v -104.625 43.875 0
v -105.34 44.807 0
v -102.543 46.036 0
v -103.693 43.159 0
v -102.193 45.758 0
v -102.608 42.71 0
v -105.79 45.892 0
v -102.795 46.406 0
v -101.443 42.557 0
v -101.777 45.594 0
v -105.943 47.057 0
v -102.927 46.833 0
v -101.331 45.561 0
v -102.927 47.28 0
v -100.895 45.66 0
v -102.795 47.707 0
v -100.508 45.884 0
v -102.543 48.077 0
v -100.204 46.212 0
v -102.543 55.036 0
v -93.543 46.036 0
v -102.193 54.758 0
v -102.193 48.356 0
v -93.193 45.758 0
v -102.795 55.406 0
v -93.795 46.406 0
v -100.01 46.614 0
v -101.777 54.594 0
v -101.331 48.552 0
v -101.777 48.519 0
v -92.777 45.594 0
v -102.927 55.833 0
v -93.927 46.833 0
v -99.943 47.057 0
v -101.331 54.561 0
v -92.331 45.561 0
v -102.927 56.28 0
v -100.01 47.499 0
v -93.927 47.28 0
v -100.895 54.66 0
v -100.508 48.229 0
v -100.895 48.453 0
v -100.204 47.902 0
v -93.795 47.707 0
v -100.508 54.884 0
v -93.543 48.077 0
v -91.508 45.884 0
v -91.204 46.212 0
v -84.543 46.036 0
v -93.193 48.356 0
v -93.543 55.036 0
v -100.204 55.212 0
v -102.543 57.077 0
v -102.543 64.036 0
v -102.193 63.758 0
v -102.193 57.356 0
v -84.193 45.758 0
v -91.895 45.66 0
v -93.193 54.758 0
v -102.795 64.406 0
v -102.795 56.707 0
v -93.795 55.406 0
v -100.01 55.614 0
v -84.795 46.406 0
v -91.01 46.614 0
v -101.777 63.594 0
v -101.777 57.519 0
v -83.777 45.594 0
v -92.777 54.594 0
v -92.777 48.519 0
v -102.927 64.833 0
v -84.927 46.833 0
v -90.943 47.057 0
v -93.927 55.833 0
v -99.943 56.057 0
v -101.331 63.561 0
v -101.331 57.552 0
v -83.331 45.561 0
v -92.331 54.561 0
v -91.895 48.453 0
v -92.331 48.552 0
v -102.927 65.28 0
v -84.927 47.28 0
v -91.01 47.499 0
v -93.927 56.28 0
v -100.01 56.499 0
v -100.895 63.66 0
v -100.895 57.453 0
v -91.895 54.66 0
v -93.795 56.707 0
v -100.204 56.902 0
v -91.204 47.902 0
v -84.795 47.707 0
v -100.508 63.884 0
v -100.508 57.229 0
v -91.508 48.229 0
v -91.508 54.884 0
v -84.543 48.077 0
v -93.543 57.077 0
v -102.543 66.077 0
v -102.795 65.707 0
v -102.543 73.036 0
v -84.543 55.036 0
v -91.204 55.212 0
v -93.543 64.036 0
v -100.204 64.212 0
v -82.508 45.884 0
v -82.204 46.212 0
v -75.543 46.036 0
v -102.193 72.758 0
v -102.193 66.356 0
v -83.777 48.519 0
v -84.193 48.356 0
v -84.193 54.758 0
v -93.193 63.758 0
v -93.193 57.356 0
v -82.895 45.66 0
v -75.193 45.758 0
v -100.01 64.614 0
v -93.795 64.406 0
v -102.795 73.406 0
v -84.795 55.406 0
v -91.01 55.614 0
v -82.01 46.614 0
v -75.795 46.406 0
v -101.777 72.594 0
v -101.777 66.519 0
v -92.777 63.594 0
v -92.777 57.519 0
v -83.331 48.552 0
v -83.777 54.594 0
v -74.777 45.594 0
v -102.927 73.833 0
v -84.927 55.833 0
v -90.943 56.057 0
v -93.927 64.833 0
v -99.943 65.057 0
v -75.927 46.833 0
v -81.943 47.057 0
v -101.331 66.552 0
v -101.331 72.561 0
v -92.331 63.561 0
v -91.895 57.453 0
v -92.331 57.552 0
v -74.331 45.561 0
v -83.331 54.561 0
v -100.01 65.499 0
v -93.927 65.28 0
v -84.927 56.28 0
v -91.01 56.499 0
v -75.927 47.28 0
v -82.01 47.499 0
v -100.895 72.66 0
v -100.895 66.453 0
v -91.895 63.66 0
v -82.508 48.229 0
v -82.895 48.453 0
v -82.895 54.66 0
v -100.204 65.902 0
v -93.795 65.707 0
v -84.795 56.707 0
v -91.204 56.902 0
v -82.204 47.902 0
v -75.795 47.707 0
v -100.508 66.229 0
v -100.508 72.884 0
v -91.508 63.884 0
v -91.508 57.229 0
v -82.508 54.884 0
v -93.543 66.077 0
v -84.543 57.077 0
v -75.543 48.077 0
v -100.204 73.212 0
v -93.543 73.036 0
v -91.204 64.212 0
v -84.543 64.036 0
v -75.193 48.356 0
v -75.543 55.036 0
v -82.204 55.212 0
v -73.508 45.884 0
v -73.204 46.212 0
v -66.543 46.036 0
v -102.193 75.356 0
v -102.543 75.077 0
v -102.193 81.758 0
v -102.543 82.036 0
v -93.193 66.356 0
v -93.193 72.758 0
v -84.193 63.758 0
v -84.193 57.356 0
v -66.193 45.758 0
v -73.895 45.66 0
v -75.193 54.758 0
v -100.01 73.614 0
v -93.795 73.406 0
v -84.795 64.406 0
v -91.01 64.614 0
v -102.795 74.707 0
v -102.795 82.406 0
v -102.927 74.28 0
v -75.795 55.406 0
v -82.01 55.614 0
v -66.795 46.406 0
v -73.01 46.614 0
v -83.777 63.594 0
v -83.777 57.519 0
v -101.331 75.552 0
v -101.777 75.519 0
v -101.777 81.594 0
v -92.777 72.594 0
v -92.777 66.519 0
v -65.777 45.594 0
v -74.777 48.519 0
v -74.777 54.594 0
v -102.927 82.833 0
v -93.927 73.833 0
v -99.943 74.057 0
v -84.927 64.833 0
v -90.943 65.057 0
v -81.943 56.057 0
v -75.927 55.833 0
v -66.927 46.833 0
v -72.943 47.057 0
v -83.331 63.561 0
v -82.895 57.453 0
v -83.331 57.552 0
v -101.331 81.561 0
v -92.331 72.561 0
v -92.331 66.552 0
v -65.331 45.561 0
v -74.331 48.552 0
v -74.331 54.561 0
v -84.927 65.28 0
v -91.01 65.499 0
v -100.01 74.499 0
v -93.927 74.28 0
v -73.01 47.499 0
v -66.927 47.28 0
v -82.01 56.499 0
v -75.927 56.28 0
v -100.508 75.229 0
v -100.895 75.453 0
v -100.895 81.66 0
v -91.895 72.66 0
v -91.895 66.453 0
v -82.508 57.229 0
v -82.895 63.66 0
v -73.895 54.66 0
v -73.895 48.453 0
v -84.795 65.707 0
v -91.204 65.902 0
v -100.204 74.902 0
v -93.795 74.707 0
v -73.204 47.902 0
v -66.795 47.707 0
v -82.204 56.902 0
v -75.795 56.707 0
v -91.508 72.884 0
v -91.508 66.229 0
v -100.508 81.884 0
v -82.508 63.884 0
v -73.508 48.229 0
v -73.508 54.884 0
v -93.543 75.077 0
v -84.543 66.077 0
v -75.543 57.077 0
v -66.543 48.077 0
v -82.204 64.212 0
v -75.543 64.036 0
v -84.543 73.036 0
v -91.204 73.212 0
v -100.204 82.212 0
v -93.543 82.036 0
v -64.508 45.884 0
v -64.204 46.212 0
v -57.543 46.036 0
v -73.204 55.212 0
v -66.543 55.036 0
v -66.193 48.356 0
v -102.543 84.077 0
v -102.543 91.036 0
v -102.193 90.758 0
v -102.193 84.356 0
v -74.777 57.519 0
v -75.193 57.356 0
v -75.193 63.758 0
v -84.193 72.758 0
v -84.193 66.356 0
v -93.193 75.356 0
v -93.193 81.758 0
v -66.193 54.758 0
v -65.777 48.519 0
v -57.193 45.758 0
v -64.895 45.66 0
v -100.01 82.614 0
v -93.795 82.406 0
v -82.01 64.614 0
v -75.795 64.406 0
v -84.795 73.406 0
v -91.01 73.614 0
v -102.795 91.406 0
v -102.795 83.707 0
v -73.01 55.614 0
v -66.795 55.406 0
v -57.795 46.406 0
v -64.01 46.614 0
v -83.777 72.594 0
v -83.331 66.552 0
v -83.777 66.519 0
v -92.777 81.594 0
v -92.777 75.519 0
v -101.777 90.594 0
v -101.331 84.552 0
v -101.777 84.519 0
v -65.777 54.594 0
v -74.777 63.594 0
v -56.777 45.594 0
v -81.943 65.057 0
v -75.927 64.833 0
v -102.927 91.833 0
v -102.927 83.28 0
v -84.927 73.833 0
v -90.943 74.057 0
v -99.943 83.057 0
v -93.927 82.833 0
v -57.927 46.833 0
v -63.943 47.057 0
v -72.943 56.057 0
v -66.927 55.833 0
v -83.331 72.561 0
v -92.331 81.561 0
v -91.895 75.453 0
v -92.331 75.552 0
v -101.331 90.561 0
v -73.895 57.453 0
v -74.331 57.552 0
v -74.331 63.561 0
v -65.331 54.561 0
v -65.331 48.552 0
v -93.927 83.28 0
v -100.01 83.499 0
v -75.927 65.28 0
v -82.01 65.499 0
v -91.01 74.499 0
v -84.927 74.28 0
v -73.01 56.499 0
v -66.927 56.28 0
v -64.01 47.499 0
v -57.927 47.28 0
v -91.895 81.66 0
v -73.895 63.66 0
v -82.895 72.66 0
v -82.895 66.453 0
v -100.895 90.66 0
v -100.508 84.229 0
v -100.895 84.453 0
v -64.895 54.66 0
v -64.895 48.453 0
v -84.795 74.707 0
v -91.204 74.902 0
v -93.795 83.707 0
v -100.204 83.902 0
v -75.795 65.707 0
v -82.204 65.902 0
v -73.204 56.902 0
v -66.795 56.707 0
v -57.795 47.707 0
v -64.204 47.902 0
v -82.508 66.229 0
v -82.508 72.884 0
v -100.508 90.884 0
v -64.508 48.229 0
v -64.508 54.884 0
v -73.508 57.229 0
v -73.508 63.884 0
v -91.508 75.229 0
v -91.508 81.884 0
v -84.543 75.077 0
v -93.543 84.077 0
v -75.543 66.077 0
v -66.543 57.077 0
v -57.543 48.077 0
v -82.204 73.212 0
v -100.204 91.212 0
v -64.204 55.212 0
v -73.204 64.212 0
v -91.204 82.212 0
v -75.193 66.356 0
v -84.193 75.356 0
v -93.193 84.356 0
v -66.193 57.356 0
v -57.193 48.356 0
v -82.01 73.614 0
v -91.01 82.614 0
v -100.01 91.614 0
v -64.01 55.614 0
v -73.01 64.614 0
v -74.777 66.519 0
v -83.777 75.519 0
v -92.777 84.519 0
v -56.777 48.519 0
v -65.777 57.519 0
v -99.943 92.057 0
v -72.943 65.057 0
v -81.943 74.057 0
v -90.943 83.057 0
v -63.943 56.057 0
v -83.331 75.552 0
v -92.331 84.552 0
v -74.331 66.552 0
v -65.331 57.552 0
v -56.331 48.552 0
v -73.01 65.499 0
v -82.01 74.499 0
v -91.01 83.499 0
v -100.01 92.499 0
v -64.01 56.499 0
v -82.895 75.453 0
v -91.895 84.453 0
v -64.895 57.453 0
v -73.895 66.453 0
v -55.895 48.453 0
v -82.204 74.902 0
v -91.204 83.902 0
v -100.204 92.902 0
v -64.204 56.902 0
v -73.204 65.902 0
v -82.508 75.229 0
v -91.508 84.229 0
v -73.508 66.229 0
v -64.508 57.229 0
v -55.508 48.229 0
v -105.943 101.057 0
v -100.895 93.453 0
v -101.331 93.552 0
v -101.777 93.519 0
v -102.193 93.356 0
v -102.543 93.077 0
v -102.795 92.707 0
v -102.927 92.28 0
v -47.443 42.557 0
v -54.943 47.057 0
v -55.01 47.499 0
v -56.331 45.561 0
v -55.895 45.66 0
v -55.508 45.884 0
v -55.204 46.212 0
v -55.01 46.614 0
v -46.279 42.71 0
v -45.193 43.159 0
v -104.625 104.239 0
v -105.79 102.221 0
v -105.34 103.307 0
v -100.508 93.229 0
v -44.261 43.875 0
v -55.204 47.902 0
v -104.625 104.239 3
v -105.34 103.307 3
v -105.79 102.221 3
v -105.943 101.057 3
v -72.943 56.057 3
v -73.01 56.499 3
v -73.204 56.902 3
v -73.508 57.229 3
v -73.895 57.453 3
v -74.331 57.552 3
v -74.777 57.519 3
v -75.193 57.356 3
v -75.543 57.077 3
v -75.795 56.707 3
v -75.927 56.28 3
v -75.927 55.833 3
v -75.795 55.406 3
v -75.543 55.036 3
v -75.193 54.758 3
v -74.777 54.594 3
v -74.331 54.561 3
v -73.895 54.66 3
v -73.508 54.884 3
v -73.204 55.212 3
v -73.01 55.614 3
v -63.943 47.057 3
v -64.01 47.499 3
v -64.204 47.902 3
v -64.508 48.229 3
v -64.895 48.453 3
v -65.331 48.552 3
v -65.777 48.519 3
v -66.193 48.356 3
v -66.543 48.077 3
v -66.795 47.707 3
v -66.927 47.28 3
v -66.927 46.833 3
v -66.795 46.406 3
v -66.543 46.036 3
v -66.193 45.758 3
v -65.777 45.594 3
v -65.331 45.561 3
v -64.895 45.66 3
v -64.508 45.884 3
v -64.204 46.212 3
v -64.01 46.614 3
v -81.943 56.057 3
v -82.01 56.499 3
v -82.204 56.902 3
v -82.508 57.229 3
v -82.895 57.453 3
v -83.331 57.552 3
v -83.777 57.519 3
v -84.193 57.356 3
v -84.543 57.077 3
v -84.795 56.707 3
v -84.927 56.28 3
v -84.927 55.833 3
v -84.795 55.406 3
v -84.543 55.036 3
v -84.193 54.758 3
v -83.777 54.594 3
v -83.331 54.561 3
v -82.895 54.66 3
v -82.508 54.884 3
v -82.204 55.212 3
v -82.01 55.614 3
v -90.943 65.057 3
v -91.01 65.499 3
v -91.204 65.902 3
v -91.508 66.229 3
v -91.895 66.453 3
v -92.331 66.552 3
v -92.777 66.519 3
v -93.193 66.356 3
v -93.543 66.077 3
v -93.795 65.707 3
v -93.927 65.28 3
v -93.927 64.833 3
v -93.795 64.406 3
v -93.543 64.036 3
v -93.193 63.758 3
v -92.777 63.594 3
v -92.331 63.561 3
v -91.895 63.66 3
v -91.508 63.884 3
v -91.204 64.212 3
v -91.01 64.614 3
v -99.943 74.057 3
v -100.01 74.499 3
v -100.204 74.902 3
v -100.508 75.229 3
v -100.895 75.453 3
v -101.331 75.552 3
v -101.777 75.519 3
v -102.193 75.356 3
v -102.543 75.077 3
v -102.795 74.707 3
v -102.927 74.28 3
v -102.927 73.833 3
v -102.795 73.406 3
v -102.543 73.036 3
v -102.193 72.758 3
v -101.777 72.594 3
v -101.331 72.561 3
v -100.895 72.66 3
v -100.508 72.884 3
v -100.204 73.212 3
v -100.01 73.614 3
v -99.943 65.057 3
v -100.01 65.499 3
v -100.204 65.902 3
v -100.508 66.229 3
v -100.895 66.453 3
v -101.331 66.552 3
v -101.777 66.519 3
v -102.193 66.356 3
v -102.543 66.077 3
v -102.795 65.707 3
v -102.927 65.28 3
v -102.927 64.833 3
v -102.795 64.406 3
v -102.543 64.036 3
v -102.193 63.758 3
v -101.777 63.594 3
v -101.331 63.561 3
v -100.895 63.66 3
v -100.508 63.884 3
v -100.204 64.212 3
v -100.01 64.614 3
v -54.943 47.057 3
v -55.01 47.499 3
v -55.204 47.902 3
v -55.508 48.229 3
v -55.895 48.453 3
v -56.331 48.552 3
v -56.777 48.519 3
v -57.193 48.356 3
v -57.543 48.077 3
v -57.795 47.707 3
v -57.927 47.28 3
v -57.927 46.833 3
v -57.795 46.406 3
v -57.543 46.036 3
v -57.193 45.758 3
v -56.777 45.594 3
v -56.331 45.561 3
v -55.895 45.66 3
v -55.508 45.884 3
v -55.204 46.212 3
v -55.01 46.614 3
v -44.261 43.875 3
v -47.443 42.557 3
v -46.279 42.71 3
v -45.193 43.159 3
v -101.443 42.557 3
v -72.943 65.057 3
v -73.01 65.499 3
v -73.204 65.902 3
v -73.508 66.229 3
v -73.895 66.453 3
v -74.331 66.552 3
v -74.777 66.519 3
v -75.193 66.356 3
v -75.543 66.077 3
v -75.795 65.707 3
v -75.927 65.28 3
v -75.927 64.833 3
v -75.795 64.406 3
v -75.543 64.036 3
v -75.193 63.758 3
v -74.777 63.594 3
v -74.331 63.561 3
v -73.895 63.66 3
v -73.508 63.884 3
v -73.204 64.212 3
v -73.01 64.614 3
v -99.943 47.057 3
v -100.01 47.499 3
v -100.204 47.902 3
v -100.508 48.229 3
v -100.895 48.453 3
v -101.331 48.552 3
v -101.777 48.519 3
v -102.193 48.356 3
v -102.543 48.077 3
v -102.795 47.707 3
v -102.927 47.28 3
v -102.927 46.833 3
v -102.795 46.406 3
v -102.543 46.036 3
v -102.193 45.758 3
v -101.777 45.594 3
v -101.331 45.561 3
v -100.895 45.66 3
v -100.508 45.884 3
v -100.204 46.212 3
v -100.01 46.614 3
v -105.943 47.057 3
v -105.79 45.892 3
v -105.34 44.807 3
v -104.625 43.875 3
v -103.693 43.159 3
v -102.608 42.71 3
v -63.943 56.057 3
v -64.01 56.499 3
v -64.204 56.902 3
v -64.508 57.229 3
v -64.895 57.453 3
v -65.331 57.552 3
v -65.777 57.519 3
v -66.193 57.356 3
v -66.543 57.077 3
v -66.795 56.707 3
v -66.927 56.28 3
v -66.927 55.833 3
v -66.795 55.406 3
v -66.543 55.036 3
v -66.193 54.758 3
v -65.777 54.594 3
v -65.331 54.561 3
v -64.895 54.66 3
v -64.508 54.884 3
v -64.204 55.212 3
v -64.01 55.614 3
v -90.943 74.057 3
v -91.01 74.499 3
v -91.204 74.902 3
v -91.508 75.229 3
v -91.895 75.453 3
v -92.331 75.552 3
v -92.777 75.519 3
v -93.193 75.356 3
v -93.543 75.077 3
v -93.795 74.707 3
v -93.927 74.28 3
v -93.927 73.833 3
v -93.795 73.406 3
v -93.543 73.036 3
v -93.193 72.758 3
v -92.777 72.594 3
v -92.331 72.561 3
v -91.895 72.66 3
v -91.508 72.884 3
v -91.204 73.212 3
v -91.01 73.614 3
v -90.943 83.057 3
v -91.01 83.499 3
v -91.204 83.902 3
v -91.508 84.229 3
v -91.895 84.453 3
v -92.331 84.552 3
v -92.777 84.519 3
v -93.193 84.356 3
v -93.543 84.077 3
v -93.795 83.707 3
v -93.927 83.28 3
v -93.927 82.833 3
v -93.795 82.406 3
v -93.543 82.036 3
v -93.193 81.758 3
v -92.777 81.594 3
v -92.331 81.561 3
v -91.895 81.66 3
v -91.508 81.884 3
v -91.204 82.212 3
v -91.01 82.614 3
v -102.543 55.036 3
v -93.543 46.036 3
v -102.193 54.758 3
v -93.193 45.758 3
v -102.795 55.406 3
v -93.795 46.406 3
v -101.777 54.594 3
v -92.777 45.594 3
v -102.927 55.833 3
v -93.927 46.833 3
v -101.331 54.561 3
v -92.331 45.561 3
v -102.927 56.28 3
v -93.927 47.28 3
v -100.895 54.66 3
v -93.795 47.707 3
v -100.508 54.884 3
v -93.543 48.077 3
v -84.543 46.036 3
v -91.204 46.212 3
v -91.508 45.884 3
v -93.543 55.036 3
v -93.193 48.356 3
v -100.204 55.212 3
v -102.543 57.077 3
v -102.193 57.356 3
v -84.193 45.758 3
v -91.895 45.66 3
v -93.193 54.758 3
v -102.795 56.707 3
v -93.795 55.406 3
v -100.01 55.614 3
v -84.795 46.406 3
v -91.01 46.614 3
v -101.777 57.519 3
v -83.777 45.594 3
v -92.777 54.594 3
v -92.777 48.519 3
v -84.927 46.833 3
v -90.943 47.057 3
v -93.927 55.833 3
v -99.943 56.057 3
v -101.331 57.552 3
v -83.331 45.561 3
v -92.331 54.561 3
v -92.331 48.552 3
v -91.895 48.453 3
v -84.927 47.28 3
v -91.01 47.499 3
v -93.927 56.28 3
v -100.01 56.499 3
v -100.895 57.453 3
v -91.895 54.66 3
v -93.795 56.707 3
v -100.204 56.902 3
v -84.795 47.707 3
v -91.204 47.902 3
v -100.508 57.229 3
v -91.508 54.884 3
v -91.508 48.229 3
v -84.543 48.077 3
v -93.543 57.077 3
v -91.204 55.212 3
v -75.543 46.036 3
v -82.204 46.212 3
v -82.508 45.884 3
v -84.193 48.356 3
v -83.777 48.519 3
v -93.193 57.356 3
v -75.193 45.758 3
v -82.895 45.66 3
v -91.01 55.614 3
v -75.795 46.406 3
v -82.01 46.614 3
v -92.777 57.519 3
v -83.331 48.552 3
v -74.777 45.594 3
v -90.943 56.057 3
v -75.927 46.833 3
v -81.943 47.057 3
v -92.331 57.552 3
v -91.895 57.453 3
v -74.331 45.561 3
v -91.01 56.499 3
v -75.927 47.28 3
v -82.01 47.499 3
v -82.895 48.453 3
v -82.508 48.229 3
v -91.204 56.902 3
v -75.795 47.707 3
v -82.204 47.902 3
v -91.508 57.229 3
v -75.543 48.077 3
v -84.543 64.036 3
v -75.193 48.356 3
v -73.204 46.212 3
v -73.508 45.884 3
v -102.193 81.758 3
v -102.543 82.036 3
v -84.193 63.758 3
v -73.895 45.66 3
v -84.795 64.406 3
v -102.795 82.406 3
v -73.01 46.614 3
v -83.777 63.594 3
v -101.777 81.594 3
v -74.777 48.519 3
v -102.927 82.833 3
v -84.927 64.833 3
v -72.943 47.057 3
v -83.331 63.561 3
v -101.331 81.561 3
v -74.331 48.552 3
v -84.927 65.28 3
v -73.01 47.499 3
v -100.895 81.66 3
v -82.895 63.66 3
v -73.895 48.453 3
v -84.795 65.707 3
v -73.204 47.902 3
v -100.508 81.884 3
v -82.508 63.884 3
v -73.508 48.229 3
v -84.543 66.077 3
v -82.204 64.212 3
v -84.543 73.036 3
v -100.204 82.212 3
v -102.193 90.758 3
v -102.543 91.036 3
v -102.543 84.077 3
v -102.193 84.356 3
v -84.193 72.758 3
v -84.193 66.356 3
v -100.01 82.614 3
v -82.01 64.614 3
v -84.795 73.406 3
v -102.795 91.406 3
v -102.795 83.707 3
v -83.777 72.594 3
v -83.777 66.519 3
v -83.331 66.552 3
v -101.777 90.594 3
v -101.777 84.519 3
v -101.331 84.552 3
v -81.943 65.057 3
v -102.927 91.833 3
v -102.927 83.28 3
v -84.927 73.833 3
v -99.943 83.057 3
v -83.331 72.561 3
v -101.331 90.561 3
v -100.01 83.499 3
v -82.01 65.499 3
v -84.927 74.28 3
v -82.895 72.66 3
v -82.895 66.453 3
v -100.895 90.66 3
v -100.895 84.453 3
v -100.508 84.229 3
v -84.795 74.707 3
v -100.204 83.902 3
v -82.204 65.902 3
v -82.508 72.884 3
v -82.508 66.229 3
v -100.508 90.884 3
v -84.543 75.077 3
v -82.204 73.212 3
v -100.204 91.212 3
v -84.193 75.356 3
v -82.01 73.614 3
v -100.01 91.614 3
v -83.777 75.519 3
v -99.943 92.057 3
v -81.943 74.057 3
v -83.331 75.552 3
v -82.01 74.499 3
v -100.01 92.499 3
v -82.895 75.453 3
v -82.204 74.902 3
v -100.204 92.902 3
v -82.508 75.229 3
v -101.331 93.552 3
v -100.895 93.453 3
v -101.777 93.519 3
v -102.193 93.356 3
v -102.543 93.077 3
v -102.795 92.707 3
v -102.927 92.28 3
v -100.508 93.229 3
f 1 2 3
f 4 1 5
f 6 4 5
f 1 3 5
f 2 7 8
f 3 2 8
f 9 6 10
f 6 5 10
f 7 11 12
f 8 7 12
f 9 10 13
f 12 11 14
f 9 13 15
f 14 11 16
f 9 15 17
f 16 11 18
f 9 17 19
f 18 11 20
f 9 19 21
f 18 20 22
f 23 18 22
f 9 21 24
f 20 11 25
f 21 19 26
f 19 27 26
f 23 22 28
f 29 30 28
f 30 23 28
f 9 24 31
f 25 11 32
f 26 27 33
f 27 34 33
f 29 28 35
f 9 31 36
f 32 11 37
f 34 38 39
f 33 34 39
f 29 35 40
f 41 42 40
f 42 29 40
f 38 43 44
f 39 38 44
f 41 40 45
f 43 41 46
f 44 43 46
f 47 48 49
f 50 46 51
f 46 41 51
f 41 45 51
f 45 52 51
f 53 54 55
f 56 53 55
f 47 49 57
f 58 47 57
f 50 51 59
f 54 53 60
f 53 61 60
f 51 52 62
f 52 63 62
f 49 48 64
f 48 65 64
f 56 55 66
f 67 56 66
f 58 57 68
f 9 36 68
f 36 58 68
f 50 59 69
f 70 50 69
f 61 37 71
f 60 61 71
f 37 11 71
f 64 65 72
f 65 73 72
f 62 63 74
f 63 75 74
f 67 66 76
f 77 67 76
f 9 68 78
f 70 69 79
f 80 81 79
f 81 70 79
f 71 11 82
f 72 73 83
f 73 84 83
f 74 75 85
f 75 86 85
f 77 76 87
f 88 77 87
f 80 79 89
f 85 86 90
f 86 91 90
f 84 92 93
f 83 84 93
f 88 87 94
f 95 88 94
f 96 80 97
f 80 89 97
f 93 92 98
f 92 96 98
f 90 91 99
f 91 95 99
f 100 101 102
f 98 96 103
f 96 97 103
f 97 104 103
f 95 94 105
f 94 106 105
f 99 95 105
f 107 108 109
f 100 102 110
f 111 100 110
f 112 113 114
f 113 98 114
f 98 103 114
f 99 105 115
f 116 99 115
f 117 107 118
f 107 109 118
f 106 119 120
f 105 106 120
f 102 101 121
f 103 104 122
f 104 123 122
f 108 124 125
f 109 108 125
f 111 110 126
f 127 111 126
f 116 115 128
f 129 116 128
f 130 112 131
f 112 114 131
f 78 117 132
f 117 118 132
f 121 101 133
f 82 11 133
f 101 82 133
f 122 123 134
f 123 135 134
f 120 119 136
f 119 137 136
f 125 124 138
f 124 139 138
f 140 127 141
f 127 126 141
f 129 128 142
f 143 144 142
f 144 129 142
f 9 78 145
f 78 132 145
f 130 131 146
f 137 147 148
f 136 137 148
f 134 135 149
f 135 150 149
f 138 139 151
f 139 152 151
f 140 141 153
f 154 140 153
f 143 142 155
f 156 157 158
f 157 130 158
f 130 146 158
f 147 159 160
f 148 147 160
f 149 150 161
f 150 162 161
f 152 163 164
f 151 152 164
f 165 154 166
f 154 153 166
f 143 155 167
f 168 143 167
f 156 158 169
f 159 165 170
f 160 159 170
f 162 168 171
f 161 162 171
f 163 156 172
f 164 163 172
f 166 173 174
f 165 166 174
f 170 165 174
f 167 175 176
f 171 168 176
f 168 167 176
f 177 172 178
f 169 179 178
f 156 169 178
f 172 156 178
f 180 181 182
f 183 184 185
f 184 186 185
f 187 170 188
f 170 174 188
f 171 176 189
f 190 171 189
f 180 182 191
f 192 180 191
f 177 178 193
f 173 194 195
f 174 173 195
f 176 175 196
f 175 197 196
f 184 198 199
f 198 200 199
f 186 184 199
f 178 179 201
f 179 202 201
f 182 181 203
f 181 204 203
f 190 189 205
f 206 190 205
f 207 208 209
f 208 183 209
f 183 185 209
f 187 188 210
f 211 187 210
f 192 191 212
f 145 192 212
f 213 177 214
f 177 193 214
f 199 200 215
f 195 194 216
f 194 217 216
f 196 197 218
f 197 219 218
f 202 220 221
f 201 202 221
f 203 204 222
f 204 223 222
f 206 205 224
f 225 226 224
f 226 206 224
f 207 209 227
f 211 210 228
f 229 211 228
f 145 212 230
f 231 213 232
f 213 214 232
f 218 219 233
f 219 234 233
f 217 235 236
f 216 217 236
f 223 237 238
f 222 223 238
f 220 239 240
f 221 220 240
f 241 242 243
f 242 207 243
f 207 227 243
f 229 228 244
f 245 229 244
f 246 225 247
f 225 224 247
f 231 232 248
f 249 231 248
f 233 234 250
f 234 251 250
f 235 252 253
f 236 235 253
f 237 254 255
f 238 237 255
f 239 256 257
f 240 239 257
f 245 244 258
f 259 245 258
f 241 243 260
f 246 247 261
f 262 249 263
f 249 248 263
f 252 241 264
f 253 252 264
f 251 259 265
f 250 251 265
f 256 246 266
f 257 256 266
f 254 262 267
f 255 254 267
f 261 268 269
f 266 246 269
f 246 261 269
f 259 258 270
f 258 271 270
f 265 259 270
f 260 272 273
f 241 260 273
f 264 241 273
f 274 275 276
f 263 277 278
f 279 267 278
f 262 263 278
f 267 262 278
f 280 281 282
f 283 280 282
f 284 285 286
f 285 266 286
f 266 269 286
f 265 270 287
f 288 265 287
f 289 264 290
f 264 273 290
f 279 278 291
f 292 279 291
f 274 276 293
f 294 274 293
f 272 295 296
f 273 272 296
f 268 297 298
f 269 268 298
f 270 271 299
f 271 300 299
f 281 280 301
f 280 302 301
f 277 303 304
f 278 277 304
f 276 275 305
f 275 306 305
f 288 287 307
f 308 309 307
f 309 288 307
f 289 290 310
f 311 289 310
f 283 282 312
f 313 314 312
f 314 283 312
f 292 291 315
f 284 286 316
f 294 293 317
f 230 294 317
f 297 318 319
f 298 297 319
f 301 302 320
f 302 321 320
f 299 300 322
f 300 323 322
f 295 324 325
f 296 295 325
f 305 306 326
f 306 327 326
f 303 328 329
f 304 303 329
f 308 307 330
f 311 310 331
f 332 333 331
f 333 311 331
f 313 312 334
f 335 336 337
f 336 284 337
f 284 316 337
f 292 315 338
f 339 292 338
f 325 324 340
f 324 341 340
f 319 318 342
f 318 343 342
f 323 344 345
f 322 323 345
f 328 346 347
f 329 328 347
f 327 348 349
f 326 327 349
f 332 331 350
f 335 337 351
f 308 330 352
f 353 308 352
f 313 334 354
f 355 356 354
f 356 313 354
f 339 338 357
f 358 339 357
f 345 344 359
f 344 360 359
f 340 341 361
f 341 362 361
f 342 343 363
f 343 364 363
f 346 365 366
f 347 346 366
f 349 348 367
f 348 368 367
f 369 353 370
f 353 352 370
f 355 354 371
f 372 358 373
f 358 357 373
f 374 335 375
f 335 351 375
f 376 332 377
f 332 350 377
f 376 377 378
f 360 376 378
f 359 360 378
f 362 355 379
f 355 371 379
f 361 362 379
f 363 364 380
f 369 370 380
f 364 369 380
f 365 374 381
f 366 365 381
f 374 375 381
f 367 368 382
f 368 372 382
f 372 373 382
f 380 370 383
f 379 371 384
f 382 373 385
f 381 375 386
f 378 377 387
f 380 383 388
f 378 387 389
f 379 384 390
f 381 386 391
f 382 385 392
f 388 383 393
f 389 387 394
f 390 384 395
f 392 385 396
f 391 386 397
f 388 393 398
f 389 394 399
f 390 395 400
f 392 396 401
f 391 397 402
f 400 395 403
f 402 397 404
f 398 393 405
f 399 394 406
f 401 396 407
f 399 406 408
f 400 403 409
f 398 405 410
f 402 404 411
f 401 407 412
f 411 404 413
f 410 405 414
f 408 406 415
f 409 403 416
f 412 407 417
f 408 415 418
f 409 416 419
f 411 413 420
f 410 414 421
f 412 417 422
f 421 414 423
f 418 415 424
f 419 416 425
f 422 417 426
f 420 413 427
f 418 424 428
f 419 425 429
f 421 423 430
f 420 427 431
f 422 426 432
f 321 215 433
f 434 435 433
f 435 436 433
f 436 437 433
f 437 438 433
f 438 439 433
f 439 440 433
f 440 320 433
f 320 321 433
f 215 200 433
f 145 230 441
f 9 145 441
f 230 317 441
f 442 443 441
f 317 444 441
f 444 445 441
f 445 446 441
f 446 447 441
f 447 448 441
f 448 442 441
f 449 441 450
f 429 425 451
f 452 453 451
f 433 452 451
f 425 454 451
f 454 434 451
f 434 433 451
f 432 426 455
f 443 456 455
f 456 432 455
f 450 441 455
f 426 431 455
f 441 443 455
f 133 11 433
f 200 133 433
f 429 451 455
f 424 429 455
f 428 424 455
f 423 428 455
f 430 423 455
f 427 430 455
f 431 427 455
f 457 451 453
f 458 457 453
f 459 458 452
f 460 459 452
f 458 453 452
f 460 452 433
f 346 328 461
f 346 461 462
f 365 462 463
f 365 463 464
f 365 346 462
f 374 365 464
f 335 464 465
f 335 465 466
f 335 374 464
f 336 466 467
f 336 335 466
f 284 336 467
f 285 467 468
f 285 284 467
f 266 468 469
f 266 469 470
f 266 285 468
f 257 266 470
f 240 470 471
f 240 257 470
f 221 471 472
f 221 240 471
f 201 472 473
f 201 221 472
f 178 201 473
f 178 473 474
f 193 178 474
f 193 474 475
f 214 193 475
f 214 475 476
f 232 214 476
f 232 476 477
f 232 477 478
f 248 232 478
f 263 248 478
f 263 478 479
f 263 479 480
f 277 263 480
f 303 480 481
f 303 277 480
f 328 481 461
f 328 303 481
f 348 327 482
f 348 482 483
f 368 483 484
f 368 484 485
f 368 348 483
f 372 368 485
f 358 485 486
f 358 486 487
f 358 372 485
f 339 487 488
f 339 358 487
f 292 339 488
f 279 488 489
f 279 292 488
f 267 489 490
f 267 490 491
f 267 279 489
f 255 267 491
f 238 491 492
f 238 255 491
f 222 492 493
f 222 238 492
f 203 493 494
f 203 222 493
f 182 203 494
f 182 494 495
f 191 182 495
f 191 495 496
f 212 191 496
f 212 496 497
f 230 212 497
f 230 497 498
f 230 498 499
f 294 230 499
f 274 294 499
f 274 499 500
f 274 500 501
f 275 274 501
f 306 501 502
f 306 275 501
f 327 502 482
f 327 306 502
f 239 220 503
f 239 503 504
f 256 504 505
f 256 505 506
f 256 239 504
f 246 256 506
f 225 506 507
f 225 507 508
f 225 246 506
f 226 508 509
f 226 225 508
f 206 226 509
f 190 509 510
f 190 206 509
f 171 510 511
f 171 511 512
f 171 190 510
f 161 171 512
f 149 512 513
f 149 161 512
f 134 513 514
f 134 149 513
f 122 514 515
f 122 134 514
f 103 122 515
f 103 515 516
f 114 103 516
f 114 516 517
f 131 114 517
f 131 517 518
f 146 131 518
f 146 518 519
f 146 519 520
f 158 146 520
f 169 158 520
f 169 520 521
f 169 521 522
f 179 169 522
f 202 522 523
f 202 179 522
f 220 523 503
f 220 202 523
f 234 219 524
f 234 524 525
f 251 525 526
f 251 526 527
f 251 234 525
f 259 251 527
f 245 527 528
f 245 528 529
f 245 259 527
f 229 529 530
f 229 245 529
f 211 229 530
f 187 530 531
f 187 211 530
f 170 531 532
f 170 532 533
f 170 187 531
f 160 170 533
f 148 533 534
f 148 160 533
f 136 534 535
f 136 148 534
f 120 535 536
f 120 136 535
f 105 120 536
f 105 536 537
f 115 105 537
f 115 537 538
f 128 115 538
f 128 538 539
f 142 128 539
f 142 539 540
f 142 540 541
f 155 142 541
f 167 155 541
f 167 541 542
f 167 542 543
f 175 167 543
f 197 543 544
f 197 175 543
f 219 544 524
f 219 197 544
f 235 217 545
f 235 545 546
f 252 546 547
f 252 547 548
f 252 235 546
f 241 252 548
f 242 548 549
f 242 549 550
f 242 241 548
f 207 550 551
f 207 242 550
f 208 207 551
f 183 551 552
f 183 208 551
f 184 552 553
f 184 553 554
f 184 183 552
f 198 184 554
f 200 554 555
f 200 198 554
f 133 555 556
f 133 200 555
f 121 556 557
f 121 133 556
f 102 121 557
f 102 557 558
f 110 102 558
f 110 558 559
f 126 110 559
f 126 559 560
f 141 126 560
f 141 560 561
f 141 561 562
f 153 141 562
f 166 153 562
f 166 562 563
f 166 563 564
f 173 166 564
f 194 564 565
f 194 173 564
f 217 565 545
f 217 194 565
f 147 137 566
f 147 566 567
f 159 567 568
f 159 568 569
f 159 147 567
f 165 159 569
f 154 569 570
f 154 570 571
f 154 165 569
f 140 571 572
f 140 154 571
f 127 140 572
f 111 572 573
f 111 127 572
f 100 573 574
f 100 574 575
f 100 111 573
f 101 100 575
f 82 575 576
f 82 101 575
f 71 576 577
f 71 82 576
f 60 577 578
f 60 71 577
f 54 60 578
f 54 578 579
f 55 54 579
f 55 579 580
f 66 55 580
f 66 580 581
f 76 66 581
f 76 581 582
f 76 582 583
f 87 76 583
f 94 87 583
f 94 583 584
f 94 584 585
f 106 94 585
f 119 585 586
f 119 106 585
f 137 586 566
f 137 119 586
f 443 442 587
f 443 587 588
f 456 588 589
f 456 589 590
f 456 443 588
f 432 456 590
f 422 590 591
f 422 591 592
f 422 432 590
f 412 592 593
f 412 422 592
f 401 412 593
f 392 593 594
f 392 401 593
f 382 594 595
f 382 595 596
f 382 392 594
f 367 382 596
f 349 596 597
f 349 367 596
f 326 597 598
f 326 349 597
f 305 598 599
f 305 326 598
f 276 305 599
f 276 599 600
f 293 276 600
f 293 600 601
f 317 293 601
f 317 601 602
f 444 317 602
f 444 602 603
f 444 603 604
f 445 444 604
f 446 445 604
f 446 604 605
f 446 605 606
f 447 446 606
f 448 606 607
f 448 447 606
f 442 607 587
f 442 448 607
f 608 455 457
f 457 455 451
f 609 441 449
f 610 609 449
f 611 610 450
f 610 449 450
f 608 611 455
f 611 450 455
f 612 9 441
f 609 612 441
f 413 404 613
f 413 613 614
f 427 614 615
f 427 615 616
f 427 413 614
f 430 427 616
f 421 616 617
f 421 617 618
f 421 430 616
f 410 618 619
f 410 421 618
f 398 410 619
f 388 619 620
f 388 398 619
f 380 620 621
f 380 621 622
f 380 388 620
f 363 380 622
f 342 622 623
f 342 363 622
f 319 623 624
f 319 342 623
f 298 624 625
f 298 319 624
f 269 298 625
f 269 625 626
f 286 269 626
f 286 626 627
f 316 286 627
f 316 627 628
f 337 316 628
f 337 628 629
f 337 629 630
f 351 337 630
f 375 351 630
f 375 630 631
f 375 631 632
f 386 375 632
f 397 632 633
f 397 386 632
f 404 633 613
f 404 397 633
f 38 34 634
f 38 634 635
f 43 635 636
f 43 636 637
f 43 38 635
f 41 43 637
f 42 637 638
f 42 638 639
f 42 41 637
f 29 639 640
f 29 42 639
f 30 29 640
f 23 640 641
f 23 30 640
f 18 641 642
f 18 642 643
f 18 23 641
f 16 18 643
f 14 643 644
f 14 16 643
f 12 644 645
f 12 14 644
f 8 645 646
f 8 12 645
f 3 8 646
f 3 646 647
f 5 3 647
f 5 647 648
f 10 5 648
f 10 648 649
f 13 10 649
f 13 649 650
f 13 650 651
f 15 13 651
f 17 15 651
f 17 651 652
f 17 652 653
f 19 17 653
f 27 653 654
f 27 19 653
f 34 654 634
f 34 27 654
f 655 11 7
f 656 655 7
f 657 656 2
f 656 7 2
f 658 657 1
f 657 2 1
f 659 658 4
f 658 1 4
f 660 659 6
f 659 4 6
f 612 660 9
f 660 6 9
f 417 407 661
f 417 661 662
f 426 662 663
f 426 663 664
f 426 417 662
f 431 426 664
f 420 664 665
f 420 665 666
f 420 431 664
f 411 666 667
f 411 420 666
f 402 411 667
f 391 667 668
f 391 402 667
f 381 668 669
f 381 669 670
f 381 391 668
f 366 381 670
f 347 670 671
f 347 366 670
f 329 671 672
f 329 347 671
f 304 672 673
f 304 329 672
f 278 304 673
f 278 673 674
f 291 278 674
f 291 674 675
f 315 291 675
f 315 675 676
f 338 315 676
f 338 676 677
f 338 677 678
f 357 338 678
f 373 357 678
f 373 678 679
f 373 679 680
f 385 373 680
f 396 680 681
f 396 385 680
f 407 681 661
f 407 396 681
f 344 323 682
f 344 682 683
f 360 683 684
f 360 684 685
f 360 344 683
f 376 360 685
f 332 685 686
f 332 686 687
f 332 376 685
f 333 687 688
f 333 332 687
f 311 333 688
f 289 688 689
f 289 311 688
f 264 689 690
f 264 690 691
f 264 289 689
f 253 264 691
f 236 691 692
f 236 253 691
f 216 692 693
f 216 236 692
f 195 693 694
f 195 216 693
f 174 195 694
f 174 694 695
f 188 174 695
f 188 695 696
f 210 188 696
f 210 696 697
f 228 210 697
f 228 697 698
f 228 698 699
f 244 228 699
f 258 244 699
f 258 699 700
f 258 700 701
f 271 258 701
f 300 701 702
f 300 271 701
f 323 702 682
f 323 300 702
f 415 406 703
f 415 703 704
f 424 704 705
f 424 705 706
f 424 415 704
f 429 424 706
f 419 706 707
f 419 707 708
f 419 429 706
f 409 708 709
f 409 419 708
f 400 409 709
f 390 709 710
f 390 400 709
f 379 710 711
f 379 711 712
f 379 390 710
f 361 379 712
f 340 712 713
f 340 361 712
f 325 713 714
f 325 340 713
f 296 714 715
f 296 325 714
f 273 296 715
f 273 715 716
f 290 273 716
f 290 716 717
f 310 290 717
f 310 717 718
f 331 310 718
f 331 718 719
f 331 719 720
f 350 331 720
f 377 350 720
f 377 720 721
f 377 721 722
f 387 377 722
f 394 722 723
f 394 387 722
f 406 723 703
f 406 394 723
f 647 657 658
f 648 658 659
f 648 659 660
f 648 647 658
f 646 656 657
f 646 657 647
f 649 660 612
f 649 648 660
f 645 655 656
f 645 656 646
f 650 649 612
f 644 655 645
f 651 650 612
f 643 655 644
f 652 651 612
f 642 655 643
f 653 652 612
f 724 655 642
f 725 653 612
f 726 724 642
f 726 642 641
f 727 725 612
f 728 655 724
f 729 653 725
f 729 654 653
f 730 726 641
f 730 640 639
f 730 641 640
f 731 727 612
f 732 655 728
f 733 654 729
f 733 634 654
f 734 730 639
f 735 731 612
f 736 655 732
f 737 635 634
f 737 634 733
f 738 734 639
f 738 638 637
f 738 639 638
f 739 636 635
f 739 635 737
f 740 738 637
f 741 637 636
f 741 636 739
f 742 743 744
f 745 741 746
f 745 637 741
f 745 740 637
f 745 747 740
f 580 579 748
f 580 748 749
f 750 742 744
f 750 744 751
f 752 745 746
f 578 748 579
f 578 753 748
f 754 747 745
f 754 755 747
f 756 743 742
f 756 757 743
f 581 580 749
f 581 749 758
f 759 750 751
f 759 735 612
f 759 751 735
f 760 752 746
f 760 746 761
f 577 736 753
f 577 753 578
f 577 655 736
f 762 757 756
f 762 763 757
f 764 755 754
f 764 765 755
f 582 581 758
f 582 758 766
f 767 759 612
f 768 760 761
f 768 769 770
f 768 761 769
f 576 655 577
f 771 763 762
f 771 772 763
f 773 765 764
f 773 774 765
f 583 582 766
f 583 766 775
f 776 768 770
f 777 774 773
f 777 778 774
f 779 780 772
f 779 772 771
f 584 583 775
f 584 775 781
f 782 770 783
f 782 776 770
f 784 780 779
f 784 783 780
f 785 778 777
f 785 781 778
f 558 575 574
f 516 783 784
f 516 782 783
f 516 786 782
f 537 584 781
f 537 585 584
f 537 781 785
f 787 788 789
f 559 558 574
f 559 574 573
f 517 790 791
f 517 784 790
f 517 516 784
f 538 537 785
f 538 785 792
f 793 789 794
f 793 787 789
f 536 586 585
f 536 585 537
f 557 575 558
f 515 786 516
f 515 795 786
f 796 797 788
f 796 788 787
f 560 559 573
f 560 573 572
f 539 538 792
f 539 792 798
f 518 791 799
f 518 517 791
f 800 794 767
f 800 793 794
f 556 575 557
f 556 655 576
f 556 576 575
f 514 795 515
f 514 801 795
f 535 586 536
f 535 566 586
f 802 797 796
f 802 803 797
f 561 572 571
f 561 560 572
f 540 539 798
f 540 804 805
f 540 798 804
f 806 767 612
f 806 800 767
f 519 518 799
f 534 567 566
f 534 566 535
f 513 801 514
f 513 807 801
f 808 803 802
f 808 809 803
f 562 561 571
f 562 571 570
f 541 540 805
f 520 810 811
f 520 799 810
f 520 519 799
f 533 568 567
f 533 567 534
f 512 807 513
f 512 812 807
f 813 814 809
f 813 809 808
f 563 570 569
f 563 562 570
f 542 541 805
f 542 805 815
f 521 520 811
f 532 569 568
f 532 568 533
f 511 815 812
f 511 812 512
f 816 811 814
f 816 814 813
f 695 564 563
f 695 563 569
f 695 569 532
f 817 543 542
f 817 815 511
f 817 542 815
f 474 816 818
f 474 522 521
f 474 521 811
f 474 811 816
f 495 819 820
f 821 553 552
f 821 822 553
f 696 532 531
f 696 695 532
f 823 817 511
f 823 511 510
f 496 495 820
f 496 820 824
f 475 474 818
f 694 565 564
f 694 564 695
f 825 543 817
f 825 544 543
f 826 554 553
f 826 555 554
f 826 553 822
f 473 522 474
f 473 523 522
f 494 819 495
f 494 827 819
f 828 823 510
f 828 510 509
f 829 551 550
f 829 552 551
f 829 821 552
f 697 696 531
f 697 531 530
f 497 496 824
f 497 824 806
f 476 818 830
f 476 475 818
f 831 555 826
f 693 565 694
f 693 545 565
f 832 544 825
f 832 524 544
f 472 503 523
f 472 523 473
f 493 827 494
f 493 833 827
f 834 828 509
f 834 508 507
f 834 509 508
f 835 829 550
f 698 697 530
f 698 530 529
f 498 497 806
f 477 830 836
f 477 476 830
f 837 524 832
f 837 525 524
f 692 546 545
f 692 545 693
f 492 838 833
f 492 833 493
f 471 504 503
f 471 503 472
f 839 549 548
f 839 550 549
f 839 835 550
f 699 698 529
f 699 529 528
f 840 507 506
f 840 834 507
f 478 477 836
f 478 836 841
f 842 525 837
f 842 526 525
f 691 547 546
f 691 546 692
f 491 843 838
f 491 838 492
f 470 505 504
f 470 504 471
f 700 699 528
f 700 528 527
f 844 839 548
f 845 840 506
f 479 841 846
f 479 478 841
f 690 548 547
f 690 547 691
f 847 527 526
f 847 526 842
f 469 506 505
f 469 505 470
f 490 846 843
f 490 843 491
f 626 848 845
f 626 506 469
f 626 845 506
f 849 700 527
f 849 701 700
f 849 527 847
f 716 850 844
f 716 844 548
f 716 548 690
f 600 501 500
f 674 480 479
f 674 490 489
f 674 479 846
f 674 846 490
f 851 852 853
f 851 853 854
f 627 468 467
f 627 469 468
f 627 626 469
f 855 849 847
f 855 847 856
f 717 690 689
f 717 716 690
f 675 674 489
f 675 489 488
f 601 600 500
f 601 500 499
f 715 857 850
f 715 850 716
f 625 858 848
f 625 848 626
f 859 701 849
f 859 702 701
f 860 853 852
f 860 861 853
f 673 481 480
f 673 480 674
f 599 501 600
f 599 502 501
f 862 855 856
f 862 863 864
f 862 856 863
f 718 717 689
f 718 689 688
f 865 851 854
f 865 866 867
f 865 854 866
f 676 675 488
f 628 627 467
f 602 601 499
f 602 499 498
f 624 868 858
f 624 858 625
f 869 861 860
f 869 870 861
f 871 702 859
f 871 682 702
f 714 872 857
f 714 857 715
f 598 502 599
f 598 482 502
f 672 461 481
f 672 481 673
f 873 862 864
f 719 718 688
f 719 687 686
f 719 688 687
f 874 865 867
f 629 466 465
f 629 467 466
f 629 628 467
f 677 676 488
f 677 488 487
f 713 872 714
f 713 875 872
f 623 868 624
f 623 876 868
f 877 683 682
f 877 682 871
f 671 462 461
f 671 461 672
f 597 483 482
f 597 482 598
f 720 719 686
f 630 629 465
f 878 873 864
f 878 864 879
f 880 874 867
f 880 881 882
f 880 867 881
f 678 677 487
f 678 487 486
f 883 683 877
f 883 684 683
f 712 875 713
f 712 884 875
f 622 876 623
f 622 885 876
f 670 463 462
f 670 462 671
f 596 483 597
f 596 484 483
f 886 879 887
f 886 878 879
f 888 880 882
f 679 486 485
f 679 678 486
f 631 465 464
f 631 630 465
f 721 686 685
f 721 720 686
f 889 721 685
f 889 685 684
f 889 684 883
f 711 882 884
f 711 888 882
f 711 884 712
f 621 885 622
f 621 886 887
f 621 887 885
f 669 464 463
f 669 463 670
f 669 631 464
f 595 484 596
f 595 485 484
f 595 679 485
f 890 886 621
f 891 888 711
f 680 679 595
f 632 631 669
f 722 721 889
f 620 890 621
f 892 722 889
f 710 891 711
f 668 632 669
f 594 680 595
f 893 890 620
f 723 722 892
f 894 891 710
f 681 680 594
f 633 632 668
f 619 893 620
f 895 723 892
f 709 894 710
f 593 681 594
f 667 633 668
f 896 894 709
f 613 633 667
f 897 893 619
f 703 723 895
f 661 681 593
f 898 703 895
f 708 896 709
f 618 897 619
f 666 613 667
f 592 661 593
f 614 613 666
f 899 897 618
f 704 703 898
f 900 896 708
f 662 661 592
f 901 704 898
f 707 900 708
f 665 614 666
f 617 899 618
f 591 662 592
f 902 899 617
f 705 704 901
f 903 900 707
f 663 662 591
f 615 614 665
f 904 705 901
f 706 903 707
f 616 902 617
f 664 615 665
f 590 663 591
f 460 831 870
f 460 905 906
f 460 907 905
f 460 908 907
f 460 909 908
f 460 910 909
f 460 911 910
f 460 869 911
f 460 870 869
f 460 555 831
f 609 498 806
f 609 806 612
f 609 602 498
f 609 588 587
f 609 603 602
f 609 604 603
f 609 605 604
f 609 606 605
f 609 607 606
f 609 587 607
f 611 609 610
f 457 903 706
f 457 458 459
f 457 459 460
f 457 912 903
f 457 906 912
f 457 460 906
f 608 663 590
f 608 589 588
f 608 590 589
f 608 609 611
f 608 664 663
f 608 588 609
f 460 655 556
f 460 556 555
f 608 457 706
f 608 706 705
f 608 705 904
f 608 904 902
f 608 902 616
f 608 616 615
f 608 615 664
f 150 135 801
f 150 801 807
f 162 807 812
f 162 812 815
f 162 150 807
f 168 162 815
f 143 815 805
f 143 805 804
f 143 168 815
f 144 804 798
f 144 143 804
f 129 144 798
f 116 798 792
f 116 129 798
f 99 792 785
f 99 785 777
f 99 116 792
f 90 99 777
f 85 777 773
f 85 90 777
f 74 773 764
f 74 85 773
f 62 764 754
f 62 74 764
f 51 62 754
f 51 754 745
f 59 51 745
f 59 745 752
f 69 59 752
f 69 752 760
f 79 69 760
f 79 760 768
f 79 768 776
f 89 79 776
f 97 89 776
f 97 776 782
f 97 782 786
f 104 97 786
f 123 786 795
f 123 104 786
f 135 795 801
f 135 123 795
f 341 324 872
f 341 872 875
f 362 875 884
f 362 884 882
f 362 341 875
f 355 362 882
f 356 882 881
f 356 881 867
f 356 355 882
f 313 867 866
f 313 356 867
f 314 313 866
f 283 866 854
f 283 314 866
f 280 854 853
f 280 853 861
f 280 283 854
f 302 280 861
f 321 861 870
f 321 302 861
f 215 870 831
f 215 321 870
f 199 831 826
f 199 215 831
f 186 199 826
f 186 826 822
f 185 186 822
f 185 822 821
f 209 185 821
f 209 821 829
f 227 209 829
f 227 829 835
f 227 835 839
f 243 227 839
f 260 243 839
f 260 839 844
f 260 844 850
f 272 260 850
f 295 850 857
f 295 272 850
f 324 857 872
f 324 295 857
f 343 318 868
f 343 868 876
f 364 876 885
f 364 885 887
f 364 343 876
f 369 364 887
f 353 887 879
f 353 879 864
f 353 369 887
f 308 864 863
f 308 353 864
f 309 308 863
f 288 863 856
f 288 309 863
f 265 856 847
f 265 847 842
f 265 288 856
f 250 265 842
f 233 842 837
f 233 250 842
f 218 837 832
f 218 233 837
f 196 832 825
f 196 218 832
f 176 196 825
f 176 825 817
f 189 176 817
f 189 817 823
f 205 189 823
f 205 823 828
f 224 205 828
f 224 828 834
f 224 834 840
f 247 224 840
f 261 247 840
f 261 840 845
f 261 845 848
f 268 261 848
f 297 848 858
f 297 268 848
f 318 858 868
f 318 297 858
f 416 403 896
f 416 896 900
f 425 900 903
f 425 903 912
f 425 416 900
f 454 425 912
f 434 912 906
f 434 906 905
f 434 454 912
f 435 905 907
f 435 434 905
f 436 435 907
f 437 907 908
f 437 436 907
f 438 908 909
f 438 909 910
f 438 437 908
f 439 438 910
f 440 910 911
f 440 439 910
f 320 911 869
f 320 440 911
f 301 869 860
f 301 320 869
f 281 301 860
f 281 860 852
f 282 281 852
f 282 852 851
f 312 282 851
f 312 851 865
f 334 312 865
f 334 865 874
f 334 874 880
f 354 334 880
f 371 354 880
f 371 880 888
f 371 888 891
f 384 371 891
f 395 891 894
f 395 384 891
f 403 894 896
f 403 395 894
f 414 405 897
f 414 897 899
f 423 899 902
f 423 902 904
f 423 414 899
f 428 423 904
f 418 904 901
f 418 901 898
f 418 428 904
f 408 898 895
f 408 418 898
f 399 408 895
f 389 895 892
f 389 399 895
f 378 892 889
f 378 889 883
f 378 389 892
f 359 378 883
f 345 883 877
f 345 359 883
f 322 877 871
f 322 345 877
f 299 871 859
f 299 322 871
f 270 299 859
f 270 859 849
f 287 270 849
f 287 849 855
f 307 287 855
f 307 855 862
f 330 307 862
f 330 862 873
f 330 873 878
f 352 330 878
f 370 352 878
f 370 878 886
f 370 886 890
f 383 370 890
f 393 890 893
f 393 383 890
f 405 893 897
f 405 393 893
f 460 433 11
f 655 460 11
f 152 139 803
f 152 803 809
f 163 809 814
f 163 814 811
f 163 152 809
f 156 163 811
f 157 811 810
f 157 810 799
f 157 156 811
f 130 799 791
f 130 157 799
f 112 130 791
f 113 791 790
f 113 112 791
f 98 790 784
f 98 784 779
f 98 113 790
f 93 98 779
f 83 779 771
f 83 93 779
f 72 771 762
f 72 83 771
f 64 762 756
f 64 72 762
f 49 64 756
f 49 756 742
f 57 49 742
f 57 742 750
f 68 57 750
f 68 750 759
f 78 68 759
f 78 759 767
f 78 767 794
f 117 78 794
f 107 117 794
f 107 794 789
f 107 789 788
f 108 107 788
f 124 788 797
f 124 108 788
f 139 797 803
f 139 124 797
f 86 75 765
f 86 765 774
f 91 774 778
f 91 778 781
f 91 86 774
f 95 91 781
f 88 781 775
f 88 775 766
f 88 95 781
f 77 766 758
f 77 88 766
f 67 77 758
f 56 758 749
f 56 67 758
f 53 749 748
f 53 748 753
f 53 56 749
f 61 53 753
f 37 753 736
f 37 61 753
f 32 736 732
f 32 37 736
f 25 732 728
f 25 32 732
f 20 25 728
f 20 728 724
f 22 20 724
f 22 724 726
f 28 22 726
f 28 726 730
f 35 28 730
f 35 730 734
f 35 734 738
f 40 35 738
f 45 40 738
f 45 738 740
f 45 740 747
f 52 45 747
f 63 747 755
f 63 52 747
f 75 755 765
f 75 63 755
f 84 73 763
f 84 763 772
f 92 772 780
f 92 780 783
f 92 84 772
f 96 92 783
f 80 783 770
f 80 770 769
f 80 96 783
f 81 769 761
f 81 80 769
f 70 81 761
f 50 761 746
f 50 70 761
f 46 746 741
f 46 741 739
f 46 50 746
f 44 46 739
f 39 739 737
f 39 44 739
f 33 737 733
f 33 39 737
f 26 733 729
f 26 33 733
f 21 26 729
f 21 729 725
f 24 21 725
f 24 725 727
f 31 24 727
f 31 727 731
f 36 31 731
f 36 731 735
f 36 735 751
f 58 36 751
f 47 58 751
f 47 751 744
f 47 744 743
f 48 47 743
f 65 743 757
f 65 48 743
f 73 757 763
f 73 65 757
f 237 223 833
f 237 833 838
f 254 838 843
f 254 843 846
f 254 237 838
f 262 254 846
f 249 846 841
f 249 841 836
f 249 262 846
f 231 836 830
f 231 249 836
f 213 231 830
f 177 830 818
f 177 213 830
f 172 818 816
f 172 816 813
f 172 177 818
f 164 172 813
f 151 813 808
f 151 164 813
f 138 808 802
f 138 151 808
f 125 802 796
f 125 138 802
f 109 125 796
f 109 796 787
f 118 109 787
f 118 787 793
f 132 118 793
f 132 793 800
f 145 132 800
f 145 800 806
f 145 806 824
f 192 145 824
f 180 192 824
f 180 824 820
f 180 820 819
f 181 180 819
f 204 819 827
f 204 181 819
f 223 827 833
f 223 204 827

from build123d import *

# Parameters (mm, degrees)
MODEL_R                 = 1.5
SALIENTE_EXTRUIR1_DEPTH = 3


with BuildPart() as part:
    # Model → Saliente-Extruir1 (new body)
    with BuildSketch(Plane.XY):
        with BuildLine():
            Line((-105.943383637, 101.056539338), (-105.943383637, 47.056539338))
            ThreePointArc((-105.943383637, 47.056539338), (-104.625364152, 43.874558823), (-101.443383637, 42.556539338))
            Line((-101.443383637, 42.556539338), (-47.443383637, 42.556539338))
            ThreePointArc((-47.443383637, 42.556539338), (-45.721308191, 42.899081442), (-44.261403122, 43.874558823))
            Line((-44.261403122, 43.874558823), (-104.625364152, 104.238519853))
            ThreePointArc((-104.625364152, 104.238519853), (-105.600841533, 102.778614784), (-105.943383637, 101.056539338))
        make_face()
        with Locations((-101.443383637, 92.056539338)):
            Circle(MODEL_R, mode=Mode.SUBTRACT)
        with Locations((-101.443383637, 83.056539338)):
            Circle(MODEL_R, mode=Mode.SUBTRACT)
        with Locations((-92.443383637, 83.056539338)):
            Circle(MODEL_R, mode=Mode.SUBTRACT)
        with Locations((-101.443383637, 74.056539338)):
            Circle(MODEL_R, mode=Mode.SUBTRACT)
        with Locations((-92.443383637, 74.056539338)):
            Circle(MODEL_R, mode=Mode.SUBTRACT)
        with Locations((-83.443383637, 74.056539338)):
            Circle(MODEL_R, mode=Mode.SUBTRACT)
        with Locations((-101.443383637, 65.056539338)):
            Circle(MODEL_R, mode=Mode.SUBTRACT)
        with Locations((-92.443383637, 65.056539338)):
            Circle(MODEL_R, mode=Mode.SUBTRACT)
        with Locations((-83.443383637, 65.056539338)):
            Circle(MODEL_R, mode=Mode.SUBTRACT)
        with Locations((-74.443383637, 65.056539338)):
            Circle(MODEL_R, mode=Mode.SUBTRACT)
        with Locations((-101.443383637, 56.056539338)):
            Circle(MODEL_R, mode=Mode.SUBTRACT)
        with Locations((-92.443383637, 56.056539338)):
            Circle(MODEL_R, mode=Mode.SUBTRACT)
        with Locations((-83.443383637, 56.056539338)):
            Circle(MODEL_R, mode=Mode.SUBTRACT)
        with Locations((-74.443383637, 56.056539338)):
            Circle(MODEL_R, mode=Mode.SUBTRACT)
        with Locations((-65.443383637, 56.056539338)):
            Circle(MODEL_R, mode=Mode.SUBTRACT)
        with Locations((-101.443383637, 47.056539338)):
            Circle(MODEL_R, mode=Mode.SUBTRACT)
        with Locations((-92.443383637, 47.056539338)):
            Circle(MODEL_R, mode=Mode.SUBTRACT)
        with Locations((-83.443383637, 47.056539338)):
            Circle(MODEL_R, mode=Mode.SUBTRACT)
        with Locations((-74.443383637, 47.056539338)):
            Circle(MODEL_R, mode=Mode.SUBTRACT)
        with Locations((-65.443383637, 47.056539338)):
            Circle(MODEL_R, mode=Mode.SUBTRACT)
        with Locations((-56.443383637, 47.056539338)):
            Circle(MODEL_R, mode=Mode.SUBTRACT)
    extrude(amount=SALIENTE_EXTRUIR1_DEPTH)


solid = part.part
